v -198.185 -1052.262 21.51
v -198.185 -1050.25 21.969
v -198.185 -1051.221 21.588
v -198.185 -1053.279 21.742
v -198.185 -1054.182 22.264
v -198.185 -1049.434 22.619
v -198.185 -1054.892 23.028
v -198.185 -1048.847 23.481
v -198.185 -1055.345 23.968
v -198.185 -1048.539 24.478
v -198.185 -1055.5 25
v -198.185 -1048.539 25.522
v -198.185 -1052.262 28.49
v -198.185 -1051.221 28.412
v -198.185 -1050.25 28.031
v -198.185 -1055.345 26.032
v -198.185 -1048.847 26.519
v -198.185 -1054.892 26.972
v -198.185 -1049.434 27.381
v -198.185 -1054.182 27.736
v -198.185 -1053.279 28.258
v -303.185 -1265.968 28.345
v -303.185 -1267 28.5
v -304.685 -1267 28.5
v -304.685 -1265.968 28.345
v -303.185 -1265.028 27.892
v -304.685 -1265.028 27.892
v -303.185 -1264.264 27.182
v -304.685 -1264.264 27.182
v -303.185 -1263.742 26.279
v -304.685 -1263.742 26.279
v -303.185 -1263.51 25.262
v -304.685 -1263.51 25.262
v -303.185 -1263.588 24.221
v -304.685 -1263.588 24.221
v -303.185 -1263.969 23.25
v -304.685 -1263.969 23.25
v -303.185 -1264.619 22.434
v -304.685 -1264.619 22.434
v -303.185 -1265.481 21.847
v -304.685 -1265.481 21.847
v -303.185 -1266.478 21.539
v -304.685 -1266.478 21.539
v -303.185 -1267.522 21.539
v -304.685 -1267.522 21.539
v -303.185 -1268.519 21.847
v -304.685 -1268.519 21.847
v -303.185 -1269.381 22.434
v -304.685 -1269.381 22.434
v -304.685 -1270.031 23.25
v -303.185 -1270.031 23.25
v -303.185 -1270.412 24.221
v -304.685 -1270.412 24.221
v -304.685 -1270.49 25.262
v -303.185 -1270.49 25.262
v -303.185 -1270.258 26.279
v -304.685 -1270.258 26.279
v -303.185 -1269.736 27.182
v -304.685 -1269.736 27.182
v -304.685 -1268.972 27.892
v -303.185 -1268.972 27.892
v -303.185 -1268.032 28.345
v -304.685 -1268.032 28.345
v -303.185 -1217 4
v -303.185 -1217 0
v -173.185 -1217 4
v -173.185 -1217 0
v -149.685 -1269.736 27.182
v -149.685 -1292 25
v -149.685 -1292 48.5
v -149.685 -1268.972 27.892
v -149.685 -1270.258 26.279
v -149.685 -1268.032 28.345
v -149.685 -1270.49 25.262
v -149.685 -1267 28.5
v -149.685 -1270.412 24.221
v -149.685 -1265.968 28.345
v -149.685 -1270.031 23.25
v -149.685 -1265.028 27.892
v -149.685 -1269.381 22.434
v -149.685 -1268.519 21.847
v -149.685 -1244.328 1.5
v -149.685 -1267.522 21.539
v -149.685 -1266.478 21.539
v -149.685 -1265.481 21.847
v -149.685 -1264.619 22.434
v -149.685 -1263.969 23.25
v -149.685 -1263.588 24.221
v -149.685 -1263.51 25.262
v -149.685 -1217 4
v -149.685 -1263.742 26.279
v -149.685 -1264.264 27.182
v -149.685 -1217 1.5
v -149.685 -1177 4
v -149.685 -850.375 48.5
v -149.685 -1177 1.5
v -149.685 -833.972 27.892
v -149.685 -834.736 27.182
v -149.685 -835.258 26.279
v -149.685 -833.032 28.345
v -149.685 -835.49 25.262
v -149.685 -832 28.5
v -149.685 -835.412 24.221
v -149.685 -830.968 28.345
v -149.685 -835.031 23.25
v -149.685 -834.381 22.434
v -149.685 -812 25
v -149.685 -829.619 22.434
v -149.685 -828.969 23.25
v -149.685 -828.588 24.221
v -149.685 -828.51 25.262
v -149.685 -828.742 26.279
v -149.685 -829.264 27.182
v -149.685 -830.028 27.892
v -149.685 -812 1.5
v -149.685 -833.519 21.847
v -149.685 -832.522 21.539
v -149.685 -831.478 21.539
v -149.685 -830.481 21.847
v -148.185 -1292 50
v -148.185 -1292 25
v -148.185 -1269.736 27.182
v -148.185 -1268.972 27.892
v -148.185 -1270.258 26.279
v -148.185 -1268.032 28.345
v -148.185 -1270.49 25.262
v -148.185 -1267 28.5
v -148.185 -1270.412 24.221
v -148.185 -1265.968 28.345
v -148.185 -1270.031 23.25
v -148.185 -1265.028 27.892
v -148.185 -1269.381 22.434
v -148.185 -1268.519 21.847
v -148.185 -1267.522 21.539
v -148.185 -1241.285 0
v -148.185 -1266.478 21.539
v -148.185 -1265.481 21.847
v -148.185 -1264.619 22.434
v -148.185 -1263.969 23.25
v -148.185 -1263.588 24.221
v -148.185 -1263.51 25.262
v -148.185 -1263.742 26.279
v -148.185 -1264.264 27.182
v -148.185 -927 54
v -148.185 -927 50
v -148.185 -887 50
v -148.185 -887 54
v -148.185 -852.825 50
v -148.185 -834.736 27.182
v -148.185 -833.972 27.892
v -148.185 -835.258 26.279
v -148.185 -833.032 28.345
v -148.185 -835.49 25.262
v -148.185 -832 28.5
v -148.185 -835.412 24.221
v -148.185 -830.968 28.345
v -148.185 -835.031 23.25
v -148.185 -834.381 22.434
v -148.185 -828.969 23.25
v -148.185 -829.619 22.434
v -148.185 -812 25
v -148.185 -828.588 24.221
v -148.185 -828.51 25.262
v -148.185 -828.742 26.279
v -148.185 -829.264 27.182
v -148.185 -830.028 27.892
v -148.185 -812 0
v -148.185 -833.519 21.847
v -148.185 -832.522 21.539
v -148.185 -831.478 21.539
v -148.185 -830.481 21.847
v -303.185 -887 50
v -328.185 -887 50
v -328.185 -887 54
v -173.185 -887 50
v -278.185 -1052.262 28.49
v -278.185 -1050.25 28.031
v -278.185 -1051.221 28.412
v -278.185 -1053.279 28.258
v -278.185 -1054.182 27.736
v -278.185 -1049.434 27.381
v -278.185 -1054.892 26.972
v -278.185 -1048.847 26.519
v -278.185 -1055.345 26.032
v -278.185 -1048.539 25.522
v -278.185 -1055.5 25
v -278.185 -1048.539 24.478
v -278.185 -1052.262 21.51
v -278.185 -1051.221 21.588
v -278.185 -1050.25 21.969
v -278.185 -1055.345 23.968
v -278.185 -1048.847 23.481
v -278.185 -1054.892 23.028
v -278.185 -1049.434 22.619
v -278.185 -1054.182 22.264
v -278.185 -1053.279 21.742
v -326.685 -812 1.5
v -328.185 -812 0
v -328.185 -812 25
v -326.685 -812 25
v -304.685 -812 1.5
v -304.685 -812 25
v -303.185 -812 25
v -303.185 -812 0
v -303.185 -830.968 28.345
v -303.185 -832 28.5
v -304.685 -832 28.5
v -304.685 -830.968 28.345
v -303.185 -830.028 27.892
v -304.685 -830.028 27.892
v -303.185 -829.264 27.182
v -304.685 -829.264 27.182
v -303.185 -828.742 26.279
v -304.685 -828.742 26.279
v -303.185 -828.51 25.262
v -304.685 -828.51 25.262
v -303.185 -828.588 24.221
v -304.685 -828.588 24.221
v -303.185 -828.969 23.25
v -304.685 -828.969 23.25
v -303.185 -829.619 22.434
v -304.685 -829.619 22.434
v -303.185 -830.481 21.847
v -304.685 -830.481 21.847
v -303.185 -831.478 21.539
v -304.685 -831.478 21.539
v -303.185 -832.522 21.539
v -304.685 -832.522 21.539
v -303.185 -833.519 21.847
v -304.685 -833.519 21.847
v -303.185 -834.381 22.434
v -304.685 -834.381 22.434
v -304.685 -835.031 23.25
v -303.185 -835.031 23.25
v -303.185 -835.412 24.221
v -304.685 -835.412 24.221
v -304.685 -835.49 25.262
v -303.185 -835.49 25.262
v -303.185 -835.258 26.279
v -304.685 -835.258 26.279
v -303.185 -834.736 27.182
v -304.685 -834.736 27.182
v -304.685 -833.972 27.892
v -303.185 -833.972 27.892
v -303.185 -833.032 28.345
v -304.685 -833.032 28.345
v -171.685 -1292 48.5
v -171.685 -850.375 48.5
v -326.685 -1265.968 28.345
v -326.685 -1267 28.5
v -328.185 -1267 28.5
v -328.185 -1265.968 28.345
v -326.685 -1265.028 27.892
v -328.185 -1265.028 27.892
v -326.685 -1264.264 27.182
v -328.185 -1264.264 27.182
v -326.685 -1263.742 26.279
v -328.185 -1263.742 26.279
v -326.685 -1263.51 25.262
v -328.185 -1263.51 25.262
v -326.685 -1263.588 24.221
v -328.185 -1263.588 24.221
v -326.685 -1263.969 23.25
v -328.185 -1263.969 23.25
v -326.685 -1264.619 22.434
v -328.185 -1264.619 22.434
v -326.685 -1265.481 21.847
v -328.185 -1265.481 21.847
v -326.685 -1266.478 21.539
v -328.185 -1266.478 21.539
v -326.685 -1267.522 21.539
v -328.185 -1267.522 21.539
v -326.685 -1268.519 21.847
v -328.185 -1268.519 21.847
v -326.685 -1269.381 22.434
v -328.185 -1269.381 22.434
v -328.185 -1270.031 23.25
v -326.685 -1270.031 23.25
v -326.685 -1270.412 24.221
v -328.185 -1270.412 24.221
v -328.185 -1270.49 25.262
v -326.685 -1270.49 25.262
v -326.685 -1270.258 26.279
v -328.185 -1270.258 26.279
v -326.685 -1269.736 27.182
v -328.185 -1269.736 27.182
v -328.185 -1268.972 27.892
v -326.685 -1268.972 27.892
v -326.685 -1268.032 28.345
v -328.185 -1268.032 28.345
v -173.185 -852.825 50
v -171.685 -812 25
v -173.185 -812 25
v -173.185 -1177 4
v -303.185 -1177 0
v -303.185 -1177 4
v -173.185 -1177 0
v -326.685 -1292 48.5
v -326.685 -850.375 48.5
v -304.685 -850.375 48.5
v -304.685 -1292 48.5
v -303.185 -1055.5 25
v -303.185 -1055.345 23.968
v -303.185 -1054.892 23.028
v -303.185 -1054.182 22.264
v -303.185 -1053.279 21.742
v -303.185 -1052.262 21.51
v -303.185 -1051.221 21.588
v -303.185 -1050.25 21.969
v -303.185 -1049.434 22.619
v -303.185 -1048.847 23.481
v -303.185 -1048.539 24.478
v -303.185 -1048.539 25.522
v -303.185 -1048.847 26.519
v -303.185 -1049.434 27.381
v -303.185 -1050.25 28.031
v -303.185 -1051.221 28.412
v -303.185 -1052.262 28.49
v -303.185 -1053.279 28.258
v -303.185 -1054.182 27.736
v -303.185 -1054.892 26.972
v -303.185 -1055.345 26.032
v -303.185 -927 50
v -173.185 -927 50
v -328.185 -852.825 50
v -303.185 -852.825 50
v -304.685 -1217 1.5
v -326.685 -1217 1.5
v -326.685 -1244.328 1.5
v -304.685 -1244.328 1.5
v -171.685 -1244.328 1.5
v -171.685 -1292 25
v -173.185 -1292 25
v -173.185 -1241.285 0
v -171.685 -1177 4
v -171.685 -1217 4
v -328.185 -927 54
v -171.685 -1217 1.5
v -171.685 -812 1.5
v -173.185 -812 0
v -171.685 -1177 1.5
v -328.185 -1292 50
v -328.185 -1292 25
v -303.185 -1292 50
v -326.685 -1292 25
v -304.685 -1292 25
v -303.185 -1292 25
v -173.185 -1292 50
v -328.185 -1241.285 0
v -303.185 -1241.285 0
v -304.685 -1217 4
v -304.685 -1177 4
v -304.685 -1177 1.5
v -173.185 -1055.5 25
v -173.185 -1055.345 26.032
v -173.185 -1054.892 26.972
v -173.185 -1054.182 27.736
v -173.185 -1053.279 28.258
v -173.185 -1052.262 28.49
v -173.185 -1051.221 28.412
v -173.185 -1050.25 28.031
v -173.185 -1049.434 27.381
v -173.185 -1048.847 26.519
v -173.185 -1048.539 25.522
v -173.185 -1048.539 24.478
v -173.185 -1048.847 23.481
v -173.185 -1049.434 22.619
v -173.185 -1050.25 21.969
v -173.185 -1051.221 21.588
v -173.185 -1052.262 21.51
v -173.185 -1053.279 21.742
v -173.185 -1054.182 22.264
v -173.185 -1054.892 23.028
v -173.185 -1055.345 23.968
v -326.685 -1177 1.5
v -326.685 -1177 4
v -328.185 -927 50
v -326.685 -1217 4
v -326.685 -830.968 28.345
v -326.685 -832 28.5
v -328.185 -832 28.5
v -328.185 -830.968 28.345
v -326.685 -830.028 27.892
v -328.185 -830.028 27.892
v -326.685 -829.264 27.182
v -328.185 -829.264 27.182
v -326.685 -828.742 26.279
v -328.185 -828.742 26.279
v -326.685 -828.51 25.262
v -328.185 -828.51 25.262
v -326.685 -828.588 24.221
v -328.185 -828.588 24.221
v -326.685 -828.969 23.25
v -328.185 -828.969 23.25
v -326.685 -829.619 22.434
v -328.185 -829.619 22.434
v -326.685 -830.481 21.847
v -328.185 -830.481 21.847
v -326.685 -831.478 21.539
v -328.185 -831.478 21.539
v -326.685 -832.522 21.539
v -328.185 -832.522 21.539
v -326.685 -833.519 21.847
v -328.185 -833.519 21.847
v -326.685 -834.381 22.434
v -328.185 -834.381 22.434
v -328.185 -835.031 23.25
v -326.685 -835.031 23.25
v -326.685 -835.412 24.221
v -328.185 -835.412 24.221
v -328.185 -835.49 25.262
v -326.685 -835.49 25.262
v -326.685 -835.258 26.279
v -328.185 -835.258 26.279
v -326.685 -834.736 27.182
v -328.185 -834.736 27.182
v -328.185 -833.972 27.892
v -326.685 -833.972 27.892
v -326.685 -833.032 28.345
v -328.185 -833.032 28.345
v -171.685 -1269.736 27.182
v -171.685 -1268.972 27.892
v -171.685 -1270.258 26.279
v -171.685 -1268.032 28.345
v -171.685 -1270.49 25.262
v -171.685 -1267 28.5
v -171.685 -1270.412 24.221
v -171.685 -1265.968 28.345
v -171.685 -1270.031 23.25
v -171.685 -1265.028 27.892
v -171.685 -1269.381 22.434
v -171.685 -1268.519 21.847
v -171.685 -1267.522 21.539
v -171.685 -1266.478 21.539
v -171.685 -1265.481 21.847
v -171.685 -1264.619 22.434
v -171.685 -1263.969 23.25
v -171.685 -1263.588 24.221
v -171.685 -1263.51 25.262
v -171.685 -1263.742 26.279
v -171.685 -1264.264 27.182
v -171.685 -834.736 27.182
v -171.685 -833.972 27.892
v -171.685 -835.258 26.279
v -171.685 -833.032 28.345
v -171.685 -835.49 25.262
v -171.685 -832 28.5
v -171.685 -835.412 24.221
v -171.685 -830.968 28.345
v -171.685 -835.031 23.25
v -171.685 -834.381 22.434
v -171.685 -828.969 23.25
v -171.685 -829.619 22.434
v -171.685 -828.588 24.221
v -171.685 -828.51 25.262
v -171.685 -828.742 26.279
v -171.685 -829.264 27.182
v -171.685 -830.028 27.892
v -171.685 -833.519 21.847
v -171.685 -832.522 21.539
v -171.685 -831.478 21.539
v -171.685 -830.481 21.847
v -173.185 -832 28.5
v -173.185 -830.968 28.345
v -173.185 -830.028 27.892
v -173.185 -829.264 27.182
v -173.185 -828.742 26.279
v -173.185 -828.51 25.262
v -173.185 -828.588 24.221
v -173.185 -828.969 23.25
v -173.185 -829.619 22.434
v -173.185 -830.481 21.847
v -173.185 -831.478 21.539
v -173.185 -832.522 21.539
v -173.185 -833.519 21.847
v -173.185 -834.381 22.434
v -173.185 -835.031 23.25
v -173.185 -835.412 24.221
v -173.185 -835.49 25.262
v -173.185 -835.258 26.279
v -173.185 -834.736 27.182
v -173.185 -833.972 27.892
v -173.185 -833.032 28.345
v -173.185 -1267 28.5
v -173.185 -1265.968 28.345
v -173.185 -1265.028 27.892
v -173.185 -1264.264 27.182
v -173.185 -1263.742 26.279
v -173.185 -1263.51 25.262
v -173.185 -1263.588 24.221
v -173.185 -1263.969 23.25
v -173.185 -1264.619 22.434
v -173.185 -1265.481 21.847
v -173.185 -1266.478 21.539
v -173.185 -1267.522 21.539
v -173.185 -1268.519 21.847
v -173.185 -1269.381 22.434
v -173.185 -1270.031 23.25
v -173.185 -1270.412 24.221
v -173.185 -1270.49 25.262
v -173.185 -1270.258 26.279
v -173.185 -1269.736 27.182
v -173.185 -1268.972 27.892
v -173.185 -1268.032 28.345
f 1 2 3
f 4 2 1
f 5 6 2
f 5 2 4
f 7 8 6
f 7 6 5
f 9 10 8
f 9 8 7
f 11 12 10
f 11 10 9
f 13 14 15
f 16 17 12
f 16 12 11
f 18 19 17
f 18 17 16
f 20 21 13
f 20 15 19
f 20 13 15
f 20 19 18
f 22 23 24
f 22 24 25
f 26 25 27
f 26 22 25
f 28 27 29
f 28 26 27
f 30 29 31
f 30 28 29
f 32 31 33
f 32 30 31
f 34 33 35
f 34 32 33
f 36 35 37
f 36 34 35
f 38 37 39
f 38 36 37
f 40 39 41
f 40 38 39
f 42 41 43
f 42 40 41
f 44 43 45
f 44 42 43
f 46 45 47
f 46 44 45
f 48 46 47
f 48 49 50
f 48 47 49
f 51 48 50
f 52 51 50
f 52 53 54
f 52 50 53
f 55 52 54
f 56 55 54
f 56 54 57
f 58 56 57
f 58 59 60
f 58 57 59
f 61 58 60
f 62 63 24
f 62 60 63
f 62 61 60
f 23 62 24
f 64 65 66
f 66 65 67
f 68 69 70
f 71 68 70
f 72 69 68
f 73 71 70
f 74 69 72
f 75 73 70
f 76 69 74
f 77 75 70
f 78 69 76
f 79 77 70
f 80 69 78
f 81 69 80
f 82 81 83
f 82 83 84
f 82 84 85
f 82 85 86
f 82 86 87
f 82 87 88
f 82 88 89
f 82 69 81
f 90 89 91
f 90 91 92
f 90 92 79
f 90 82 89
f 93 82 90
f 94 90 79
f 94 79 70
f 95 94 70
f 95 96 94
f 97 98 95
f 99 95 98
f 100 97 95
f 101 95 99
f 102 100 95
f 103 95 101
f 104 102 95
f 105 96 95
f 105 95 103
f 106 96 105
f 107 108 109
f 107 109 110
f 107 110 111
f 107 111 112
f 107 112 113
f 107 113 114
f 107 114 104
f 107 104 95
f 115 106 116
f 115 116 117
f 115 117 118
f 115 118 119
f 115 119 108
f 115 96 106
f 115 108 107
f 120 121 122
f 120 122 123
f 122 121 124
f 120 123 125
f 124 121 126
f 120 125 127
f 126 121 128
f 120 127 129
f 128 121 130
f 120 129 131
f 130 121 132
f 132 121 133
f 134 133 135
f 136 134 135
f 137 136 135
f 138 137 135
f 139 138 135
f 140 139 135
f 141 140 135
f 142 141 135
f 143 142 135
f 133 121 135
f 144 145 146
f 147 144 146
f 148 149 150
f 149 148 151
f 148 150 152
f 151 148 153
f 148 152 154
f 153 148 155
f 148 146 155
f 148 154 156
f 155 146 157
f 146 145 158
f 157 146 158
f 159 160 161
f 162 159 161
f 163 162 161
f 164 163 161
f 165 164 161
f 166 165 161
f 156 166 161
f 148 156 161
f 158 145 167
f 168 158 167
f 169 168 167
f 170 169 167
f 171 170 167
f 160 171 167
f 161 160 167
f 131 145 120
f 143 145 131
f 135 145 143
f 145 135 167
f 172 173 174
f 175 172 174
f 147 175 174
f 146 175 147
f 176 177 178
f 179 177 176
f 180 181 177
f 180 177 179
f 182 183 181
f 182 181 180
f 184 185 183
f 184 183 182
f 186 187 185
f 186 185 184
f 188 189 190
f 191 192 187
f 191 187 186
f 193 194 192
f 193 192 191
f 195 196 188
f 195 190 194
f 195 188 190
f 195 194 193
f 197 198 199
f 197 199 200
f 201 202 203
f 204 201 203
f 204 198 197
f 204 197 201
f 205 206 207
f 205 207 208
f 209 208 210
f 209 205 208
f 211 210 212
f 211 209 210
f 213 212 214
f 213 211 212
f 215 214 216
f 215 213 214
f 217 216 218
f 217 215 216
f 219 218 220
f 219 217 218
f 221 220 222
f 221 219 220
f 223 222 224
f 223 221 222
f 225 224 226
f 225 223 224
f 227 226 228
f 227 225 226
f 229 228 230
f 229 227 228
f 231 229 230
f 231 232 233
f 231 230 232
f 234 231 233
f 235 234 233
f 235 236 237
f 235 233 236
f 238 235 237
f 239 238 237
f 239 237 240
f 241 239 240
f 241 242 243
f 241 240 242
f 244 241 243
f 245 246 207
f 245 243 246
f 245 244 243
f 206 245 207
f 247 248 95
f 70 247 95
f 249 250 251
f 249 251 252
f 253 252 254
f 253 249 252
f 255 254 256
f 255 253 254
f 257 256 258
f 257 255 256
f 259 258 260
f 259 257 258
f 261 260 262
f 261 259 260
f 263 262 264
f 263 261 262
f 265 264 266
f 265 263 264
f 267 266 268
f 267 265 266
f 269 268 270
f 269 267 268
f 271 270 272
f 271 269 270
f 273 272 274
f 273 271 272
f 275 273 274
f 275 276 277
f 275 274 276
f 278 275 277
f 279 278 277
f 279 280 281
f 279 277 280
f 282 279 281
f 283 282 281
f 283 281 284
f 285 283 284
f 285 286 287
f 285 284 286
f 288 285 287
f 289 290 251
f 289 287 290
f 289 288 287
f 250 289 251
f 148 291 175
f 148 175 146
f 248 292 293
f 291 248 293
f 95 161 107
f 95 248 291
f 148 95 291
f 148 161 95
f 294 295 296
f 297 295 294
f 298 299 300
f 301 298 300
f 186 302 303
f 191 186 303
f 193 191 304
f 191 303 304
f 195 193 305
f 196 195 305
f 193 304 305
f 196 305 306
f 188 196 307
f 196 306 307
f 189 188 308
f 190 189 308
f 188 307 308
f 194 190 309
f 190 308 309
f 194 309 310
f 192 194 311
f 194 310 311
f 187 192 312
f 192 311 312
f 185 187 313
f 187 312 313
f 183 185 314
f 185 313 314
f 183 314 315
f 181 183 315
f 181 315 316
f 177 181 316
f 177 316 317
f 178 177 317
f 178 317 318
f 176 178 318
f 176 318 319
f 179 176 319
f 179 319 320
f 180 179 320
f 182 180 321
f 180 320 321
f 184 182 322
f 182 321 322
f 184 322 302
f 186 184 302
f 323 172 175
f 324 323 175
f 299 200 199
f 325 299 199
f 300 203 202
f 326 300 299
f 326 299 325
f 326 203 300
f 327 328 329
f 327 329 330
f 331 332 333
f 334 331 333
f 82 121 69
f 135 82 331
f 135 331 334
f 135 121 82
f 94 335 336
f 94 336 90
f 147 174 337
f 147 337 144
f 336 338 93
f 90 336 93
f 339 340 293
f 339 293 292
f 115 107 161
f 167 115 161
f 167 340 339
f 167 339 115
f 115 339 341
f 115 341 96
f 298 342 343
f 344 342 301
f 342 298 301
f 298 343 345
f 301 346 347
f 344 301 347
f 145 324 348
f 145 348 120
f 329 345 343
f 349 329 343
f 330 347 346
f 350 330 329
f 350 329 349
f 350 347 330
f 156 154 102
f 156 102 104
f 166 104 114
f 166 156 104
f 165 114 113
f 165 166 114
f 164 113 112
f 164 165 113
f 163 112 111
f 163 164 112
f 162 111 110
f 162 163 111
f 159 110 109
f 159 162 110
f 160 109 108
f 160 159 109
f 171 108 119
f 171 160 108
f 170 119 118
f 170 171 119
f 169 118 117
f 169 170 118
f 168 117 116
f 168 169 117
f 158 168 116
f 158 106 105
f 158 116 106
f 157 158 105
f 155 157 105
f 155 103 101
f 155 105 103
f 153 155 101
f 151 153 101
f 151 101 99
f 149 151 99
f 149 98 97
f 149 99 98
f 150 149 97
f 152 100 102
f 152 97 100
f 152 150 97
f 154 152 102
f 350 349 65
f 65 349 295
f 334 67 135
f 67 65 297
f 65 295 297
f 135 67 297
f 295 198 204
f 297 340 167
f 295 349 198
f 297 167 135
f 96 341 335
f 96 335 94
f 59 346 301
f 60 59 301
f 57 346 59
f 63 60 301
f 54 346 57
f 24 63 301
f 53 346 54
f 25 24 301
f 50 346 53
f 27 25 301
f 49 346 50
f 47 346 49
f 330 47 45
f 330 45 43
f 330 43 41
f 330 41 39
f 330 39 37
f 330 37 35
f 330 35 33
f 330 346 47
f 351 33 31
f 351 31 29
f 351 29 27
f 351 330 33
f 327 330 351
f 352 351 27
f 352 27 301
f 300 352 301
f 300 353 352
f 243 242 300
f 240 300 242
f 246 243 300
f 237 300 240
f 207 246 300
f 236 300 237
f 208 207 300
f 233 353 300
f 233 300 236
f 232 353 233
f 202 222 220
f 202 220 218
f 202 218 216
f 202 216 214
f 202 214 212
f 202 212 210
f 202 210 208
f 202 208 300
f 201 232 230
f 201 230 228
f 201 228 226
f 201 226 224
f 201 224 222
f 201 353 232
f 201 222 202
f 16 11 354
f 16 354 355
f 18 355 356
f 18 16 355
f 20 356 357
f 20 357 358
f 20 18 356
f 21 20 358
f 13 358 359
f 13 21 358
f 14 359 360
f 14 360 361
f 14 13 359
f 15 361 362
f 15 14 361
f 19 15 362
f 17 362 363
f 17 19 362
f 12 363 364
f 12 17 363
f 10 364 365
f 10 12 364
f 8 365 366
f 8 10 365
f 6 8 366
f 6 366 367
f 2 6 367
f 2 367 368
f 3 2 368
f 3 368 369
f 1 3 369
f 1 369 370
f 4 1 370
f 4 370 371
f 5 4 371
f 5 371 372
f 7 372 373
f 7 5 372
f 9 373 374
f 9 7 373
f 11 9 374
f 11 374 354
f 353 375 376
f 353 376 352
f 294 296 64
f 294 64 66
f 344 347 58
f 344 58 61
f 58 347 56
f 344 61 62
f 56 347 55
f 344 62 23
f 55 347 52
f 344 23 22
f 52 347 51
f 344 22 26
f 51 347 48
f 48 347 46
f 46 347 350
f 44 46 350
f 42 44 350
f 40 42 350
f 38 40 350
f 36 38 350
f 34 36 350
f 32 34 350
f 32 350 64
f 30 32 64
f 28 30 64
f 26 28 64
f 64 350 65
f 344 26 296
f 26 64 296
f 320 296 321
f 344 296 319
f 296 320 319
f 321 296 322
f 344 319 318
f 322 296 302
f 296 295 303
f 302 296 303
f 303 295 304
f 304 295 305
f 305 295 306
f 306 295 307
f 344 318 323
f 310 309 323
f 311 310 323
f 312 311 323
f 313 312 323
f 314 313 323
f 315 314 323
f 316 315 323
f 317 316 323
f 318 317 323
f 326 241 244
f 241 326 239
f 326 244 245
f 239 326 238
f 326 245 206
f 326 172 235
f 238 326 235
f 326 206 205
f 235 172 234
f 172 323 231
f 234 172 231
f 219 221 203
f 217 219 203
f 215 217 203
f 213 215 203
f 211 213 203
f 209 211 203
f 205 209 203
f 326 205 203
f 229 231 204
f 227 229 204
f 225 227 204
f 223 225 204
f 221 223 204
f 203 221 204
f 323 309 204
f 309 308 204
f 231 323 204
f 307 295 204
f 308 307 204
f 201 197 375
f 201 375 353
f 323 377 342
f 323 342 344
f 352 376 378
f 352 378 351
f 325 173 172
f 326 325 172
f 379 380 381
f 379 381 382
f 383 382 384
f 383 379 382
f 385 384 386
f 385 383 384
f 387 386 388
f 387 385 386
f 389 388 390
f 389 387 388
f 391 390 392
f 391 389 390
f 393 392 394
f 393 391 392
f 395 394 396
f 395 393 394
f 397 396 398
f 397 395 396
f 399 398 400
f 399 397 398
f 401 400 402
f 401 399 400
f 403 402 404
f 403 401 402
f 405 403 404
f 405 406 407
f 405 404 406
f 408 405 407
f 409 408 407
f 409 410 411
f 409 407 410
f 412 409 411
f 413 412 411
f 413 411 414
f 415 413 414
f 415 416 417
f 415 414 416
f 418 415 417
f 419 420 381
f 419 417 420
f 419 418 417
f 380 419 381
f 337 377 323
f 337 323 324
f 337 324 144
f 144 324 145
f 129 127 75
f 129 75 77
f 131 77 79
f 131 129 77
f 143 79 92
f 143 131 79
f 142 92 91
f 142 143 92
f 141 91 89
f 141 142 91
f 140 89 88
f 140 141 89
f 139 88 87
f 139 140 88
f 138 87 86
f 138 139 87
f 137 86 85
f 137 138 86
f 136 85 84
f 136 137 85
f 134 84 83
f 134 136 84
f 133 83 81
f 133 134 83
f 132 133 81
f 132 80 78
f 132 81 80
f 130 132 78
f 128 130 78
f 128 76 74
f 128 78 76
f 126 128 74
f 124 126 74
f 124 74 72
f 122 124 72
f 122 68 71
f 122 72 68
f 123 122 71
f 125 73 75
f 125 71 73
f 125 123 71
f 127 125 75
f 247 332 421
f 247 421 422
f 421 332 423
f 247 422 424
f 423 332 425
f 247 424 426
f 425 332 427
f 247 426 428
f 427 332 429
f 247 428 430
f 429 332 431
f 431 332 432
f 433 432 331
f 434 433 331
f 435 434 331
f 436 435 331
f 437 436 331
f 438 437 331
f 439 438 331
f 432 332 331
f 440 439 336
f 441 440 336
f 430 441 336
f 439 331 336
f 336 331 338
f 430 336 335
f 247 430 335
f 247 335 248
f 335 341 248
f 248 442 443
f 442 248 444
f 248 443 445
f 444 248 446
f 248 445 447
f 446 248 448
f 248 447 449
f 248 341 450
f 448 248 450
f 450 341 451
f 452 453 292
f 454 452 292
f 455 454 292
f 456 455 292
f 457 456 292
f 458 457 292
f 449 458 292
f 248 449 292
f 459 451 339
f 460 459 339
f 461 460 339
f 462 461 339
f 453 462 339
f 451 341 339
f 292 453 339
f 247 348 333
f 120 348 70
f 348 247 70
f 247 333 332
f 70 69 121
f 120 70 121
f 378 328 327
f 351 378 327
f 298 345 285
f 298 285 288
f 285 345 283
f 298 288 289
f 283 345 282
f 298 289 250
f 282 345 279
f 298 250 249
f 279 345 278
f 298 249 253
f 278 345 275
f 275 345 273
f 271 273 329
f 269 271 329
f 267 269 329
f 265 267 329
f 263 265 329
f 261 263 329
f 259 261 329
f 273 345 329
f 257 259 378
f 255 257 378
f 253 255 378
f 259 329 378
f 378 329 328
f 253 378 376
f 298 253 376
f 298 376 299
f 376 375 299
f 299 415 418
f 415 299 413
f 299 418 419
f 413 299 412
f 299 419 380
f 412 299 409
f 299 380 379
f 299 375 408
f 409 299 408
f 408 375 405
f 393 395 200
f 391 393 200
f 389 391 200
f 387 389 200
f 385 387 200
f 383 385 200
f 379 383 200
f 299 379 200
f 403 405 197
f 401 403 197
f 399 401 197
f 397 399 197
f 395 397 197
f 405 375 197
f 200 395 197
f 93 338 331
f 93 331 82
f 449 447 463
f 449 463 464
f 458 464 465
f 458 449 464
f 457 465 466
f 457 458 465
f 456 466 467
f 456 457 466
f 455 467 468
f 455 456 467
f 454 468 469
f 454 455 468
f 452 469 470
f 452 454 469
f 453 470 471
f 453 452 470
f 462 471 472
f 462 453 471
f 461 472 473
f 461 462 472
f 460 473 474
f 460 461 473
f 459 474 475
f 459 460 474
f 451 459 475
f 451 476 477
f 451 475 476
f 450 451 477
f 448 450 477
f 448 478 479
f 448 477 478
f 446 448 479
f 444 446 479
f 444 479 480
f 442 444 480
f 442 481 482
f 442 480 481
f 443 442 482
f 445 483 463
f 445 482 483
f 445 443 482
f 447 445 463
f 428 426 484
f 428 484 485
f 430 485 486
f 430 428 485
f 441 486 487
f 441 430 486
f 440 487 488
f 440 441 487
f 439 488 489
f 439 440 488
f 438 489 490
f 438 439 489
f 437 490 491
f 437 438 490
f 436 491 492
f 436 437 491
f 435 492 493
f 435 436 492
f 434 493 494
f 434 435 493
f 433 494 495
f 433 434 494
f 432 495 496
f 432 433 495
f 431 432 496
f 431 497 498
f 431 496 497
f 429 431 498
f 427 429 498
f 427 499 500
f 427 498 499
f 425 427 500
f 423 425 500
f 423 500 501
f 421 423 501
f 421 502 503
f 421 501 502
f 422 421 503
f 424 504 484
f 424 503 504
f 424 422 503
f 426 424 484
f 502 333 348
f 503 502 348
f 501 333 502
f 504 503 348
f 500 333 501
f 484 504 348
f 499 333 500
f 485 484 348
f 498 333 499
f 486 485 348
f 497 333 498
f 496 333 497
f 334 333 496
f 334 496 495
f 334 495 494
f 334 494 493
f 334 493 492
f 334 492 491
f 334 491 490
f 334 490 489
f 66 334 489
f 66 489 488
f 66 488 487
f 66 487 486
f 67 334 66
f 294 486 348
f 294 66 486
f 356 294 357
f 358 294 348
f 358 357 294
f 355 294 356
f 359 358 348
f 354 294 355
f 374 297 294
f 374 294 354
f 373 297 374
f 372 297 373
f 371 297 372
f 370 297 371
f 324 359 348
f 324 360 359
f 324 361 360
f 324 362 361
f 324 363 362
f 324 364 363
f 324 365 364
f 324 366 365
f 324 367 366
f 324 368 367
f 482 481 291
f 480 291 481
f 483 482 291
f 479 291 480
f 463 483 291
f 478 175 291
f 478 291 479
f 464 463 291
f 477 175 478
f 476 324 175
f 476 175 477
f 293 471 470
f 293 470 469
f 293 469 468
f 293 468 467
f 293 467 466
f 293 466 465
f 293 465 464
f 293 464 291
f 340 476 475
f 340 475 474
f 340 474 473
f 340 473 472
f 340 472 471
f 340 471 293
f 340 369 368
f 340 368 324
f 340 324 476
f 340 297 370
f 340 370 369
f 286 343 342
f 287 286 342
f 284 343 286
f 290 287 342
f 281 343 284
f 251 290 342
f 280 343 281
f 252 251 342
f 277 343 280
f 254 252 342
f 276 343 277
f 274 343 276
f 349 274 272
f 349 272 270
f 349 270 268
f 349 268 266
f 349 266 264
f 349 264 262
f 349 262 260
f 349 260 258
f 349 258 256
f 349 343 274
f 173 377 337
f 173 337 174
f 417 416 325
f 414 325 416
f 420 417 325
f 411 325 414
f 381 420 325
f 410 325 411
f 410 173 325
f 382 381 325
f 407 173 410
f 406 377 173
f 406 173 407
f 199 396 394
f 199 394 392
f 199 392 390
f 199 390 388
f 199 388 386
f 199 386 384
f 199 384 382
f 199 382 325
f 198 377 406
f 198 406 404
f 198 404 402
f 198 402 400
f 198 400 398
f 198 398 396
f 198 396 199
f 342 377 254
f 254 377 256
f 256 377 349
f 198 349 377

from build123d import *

# Parameters (mm, degrees)
SKETCH1_W               = 25
SKETCH1_H               = 480
BOSS_EXTRUDE1_DEPTH     = 50
BOSS_EXTRUDE1_2_DEPTH   = 50
SHELL1_T                = -1.5
SHELL2_T                = -1.5
SKETCH2_W               = 180
SKETCH2_H               = 40
BOSS_EXTRUDE2_DEPTH     = 4
SKETCH3_W               = 180
SKETCH3_H               = 40
BOSS_EXTRUDE3_DEPTH     = 4
CUT_EXTRUDE1_DEPTH      = 1306.595649503
CUT_EXTRUDE1_DEPTH_BACK = 1306.595649503
SKETCH4_R               = 3.5
SKETCH5_R               = 3.5
BOSS_EXTRUDE4_DEPTH     = 25
BOSS_EXTRUDE5_START     = 25
SKETCH6_R               = 3.5
BOSS_EXTRUDE5_DEPTH     = 25
CUT_EXTRUDE6_DEPTH      = 1306.595649503
CUT_EXTRUDE6_DEPTH_BACK = 1306.595649503
CUT_EXTRUDE7_DEPTH      = 1306.595649503
CUT_EXTRUDE7_DEPTH_BACK = 1306.595649503


with BuildPart() as part:
    # Sketch1 → Boss-Extrude1 (new body)
    with BuildSketch(Plane.XY):
        with Locations((-160.684832451, -1052)):
            Rectangle(SKETCH1_W, SKETCH1_H)
    extrude(amount=BOSS_EXTRUDE1_DEPTH)

    # Shell2
    shell2_openings = [part.faces().sort_by_distance(p)[0] for p in [
        (-160.684832451, -1292, 25),
        (-160.684832451, -812, 25),
    ]]
    offset(amount=SHELL2_T, openings=shell2_openings, kind=Kind.INTERSECTION)



with BuildPart() as body_2:
    # Sketch1 → Boss-Extrude1 2 (new body)
    with BuildSketch(Plane.XY):
        with Locations((-315.684832451, -1052)):
            Rectangle(SKETCH1_W, SKETCH1_H)
    extrude(amount=BOSS_EXTRUDE1_2_DEPTH)

    # Shell1
    shell1_openings = [body_2.faces().sort_by_distance(p)[0] for p in [
        (-315.684832451, -812, 25),
        (-315.684832451, -1292, 25),
    ]]
    offset(amount=SHELL1_T, openings=shell1_openings, kind=Kind.INTERSECTION)


with BuildPart() as part_1:
    add(part.part)

    add(body_2.part)  # Boss-Extrude2 merges body 2
    # Sketch2 → Boss-Extrude2 (add)
    with BuildSketch(Plane.XY):
        with Locations((-238.184832451, -1197)):
            Rectangle(SKETCH2_W, SKETCH2_H)
    extrude(amount=BOSS_EXTRUDE2_DEPTH)

    # Sketch3 → Boss-Extrude3 (add)
    with BuildSketch(Plane.XY.offset(50)):
        with Locations((-238.184832451, -907)):
            Rectangle(SKETCH3_W, SKETCH3_H)
    extrude(amount=BOSS_EXTRUDE3_DEPTH)

    # Sketch4 → Cut-Extrude1 (cut, two sides: drawn at the far end of the back side and taken through both)
    with BuildSketch(Plane.ZY.offset(328.184832451).offset(-CUT_EXTRUDE1_DEPTH_BACK)):
        with Locations((25, -1267)):
            Circle(SKETCH4_R)
        with Locations((25, -832)):
            Circle(SKETCH4_R)
    extrude(amount=CUT_EXTRUDE1_DEPTH + CUT_EXTRUDE1_DEPTH_BACK, mode=Mode.SUBTRACT)

    # Sketch5 → Boss-Extrude4 (add)
    with BuildSketch(Plane(origin=(-303.184832451, 0, 0), x_dir=(0, 0, -1), z_dir=(1, 0, 0))):
        with Locations(Location((-25, -1052, 0), (0, 0, 270))):
            Circle(SKETCH5_R)
    extrude(amount=BOSS_EXTRUDE4_DEPTH)

    # Sketch6 → Boss-Extrude5 (add)
    with BuildSketch(Plane.ZY.offset(173.184832451).offset(BOSS_EXTRUDE5_START)):
        with Locations(Location((25, -1052, 0), (0, 0, 270))):
            Circle(SKETCH6_R)
    extrude(amount=-BOSS_EXTRUDE5_DEPTH)

    # Sketch11 → Cut-Extrude6 (cut, two sides: drawn at the far end of the back side and taken through both)
    with BuildSketch(Plane.ZY.offset(328.184832451).offset(-CUT_EXTRUDE6_DEPTH_BACK)):
        Polygon((25, -812), (50, -852.824757881), (50, -812), align=None)
    extrude(amount=CUT_EXTRUDE6_DEPTH + CUT_EXTRUDE6_DEPTH_BACK, mode=Mode.SUBTRACT)

    # Sketch12 → Cut-Extrude7 (cut, two sides: drawn at the far end of the back side and taken through both)
    with BuildSketch(Plane.ZY.offset(328.184832451).offset(-CUT_EXTRUDE7_DEPTH_BACK)):
        Polygon((25, -1292), (0, -1241.284902425), (0, -1292), align=None)
    extrude(amount=CUT_EXTRUDE7_DEPTH + CUT_EXTRUDE7_DEPTH_BACK, mode=Mode.SUBTRACT)


solid = part_1.part
